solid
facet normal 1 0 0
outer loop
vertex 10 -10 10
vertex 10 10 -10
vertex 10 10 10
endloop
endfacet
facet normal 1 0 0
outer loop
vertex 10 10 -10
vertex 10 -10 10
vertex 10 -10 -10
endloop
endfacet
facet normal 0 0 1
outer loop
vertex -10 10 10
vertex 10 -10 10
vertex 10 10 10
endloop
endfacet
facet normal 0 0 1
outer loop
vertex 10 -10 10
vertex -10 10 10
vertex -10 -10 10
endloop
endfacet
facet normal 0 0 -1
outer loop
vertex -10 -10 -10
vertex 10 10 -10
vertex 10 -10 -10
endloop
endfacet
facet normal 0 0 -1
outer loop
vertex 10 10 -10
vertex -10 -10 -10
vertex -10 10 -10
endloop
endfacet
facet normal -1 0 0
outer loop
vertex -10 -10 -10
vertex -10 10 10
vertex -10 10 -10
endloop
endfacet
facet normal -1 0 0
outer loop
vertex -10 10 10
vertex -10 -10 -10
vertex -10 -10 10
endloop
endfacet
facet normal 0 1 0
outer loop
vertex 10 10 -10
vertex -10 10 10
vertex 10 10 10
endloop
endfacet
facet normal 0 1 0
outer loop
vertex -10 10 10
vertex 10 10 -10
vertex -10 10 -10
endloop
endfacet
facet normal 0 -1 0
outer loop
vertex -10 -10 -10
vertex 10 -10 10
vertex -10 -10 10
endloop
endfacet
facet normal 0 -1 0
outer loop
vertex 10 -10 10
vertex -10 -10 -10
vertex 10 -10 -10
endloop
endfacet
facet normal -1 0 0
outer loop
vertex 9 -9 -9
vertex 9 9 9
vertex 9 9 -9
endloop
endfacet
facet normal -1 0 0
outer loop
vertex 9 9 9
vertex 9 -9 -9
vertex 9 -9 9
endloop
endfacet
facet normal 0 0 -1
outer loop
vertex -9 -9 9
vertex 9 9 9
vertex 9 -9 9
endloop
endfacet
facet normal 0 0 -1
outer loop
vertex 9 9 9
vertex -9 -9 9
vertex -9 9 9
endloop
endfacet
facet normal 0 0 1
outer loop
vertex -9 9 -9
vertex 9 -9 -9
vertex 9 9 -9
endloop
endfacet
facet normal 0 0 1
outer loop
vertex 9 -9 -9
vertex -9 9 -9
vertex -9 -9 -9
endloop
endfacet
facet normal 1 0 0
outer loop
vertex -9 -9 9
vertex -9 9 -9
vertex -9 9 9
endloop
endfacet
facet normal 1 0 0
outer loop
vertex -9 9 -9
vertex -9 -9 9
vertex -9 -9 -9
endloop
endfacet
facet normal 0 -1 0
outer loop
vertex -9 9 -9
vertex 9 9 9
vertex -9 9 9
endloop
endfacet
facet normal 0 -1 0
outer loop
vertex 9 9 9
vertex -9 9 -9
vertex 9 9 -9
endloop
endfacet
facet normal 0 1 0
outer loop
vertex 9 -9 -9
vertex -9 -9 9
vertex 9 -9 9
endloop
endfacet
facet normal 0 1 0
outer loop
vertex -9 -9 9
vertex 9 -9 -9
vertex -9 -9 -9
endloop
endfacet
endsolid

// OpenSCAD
//This is my first attempt at designing something in OpenSCAD and is made to replace the FreeCAD export that I had, because it was difficult to modify. 
//Designed by Kyle Randall
//////////////////////////////////////////////////
//Edit the parameters below to modify the outer dimensions of your hollow calibration cube; it will still remain hollow, but you can adjust the wall thickness.

X=20.0;//this is X-axis length (left-right)
Y=20.0;//this is the Y-axis (forward-back)
Z=20.0;// this is the Z-axis (up-down)
Wall_Thickness=1.0;//wall thickness in mm
//don't edit the code below unless you know what you're doing

module thing1()
{
	difference(){
		cube([X,Y,Z], center = true);
			cube(X-Wall_Thickness*2,Y-Wall_Thickness*2,Z-Z_Wall_Thickness*2,center=true);//the size of the inner cube
	
	}
}
thing1();
